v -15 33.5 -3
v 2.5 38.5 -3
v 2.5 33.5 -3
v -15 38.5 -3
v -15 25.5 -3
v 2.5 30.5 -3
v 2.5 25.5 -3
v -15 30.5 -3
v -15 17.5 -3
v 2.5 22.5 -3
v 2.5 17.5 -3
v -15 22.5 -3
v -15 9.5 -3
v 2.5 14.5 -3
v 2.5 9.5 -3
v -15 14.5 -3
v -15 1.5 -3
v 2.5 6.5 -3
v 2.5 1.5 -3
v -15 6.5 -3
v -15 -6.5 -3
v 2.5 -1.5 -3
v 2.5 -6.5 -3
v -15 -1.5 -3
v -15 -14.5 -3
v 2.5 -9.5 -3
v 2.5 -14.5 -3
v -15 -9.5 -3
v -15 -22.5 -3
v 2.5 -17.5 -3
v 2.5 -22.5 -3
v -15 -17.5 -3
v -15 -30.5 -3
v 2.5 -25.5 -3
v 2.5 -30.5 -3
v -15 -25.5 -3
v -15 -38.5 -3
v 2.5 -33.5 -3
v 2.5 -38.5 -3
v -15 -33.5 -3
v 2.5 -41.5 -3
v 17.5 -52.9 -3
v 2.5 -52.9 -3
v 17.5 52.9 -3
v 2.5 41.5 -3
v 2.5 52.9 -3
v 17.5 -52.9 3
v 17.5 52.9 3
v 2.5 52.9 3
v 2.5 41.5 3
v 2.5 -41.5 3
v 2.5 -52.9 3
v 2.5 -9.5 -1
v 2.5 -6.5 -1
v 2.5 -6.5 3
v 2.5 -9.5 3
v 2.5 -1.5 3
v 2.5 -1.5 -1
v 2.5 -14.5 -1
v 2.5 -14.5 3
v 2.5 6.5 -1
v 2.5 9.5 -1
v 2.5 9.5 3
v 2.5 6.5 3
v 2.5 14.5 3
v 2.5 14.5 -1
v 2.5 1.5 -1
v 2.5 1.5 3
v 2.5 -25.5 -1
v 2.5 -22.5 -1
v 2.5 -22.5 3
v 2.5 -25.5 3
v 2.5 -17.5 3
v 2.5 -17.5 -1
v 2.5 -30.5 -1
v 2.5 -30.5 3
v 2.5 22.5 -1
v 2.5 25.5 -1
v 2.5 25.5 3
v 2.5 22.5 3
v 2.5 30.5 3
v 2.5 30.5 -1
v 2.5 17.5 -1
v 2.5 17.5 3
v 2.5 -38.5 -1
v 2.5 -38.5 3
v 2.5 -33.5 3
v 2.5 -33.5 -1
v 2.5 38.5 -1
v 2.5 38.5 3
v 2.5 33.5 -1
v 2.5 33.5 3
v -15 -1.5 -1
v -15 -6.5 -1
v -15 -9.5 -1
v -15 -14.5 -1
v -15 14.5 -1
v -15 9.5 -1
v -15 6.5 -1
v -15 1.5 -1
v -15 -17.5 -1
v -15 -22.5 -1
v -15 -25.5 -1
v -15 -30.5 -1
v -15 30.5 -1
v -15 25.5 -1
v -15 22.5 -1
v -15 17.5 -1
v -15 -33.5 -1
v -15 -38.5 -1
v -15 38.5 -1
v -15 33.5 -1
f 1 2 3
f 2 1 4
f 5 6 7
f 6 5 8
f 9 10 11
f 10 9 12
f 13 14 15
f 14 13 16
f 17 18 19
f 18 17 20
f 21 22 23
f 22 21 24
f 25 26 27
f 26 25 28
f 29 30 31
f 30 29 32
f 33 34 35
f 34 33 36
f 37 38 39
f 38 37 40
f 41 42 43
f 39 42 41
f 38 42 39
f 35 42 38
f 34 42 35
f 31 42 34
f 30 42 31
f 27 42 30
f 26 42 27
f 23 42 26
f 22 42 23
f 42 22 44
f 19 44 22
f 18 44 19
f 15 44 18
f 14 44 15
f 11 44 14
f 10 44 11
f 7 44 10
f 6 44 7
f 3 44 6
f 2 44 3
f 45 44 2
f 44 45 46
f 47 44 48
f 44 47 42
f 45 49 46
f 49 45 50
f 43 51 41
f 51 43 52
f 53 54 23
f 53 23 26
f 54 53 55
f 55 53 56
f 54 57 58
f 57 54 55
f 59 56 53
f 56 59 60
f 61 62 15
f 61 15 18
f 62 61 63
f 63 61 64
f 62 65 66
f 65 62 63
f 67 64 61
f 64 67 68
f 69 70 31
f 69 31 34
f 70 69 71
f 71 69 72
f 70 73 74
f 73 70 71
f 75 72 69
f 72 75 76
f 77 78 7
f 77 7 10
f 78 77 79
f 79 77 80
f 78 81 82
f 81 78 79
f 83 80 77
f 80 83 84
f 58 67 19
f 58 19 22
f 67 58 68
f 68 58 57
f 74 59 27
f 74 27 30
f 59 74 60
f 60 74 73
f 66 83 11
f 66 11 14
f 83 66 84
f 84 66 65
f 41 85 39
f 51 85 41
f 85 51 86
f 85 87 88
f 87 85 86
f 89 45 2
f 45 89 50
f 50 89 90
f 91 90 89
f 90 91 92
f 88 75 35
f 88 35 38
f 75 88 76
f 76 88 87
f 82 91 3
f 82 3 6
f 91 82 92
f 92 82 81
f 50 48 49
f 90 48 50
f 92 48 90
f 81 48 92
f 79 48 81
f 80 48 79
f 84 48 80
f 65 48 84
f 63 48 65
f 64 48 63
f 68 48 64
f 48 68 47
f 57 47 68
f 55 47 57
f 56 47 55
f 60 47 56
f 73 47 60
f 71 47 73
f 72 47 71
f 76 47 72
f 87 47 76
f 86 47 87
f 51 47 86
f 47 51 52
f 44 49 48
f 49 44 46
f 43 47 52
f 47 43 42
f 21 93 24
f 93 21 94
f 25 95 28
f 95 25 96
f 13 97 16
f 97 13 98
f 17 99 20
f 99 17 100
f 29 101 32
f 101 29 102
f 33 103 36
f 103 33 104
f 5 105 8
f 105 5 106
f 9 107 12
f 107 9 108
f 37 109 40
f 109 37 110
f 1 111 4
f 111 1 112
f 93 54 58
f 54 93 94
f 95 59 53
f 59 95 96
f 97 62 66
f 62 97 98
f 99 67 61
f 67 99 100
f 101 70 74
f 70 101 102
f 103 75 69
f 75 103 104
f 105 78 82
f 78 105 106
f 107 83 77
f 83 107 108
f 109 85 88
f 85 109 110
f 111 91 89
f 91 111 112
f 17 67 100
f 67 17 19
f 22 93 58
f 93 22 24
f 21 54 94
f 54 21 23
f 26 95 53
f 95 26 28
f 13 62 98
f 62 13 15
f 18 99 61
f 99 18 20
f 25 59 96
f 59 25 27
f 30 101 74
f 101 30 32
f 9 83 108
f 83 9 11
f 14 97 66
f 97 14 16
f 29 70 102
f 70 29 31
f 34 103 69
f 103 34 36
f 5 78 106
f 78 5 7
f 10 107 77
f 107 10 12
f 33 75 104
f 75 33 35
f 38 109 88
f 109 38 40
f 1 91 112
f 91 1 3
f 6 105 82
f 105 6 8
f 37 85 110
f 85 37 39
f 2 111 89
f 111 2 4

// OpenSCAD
withwin = 0;
show_container = 0;
show_all = 0;
show_wall_insert = 0;
show_comb_insert = 1;

$fn = 50;

wall = 2;

ext_sz_x = 110;
//ext_sz_y = 86.2;
ext_sz_y = 85.8;
ext_sz_z = 40;

acryl_sz_x = 103;
acryl_sz_y = 82;
acryl_sz_z = 3;

bottom_sz_z = acryl_sz_z + wall;

int_sz_y = ext_sz_y - 2 * wall;
int_sz_z = ext_sz_z - bottom_sz_z;

insert_x_pos = [
  -ext_sz_x/2+8,
  -ext_sz_x/2+22, 
  0,
  ext_sz_x/2-22,
  ext_sz_x/2-8
];
insert_sz_x = 6;
insert_sz_y = (ext_sz_y - int_sz_y)/2;
insert_sz_z = int_sz_z - 6;
insert_handle_sz_z = 10;

comb_sz_x = 2;
comb_sz_z = int_sz_z - 5;
comb_handle_sz_z = 15;

gap = 0.2;

rubber_sz_z = 15;
rubber_sz_x = 1.5;

tooth_sz_z = 20;
tooth_sz_y = 5;
tooth_gap_y = 3;

insert_place_sz_z = max(insert_handle_sz_z, comb_handle_sz_z);

module gel_container() {
	difference() {
		cube([ext_sz_x, ext_sz_y, ext_sz_z], center = true);
		union() {
			for(xpos=insert_x_pos) {
				for(ysgn=[-1, 1]) {
					// top inserts
					translate([xpos, ysgn * (ext_sz_y-insert_sz_y)/2, (ext_sz_z-insert_place_sz_z)/2]) {
						cube([insert_sz_x+2*gap, insert_sz_y, insert_place_sz_z], center = true);
					}
				}
			}
			// internal emptiness
			translate([0, 0, bottom_sz_z+insert_place_sz_z/2]) {
				cube([ext_sz_x, int_sz_y, ext_sz_z+insert_place_sz_z], center = true);
			}
      if(withwin) {
        // acrylic place
        translate([0, 0, bottom_sz_z-acryl_sz_z]) {
  				cube([acryl_sz_x, acryl_sz_y, ext_sz_z], center = true);
        }
        // transparent hole
  			cube([acryl_sz_x-2*wall, acryl_sz_y-2*wall, ext_sz_z], center = true);
      }
    }
	}
}

module wall_insert() {
	// handle
	translate([0, 0, (int_sz_z-insert_handle_sz_z)/2]) {
		cube([insert_sz_x, ext_sz_y + 20, insert_handle_sz_z], center=true);
	}
	// thiner part whole height
  translate([(insert_sz_x-2*rubber_sz_x)/2, 0, 0]) {
    cube([insert_sz_x-2*rubber_sz_x, int_sz_y-2*gap, insert_sz_z], center=true);
  }
	// thicker part above rubber
	translate([0, 0, rubber_sz_z/2]) {
		cube([insert_sz_x, int_sz_y-2*gap, insert_sz_z-rubber_sz_z], center=true);
	}
}

module comb_insert() {
	difference() {
		union() {
			// handle
			translate([0, 0, (int_sz_z-comb_handle_sz_z)/2]) {
				cube([insert_sz_x, ext_sz_y + 20, comb_handle_sz_z], center=true);
			}
			// thiner part whole height
      translate([(insert_sz_x-comb_sz_x)/2, 0, 0]) {
        cube([comb_sz_x, int_sz_y-2*gap, comb_sz_z], center=true);
      }
		}
		for(ypos=[0:5]) {
			for(ysgn=[-1,1]) {
				translate([0, ysgn*(ypos*(tooth_sz_y+tooth_gap_y)), (-int_sz_z+tooth_sz_z)/2]) {
					cube([insert_sz_x, tooth_gap_y, tooth_sz_z], center=true);
				}
			}
		}
	}
}

if(show_container || show_all) {
  gel_container();
}
if(show_all) {
  for(xpos=[insert_x_pos[0], insert_x_pos[len(insert_x_pos)-1]]) {
    translate([xpos, 0, bottom_sz_z/2]) {
      wall_insert();
    }
  }
  for(xi=[1:len(insert_x_pos)-2]) {
    translate([insert_x_pos[xi], 0, bottom_sz_z/2]) {
      comb_insert();
    }
  }
}
if(show_comb_insert) {
  rotate([0, 90, 0]) {
    comb_insert();
  }
}

if(show_wall_insert) {
  translate([37, 0, 0]) {
    rotate([0, 90, 0]) {
      wall_insert();
    }
  }
}
